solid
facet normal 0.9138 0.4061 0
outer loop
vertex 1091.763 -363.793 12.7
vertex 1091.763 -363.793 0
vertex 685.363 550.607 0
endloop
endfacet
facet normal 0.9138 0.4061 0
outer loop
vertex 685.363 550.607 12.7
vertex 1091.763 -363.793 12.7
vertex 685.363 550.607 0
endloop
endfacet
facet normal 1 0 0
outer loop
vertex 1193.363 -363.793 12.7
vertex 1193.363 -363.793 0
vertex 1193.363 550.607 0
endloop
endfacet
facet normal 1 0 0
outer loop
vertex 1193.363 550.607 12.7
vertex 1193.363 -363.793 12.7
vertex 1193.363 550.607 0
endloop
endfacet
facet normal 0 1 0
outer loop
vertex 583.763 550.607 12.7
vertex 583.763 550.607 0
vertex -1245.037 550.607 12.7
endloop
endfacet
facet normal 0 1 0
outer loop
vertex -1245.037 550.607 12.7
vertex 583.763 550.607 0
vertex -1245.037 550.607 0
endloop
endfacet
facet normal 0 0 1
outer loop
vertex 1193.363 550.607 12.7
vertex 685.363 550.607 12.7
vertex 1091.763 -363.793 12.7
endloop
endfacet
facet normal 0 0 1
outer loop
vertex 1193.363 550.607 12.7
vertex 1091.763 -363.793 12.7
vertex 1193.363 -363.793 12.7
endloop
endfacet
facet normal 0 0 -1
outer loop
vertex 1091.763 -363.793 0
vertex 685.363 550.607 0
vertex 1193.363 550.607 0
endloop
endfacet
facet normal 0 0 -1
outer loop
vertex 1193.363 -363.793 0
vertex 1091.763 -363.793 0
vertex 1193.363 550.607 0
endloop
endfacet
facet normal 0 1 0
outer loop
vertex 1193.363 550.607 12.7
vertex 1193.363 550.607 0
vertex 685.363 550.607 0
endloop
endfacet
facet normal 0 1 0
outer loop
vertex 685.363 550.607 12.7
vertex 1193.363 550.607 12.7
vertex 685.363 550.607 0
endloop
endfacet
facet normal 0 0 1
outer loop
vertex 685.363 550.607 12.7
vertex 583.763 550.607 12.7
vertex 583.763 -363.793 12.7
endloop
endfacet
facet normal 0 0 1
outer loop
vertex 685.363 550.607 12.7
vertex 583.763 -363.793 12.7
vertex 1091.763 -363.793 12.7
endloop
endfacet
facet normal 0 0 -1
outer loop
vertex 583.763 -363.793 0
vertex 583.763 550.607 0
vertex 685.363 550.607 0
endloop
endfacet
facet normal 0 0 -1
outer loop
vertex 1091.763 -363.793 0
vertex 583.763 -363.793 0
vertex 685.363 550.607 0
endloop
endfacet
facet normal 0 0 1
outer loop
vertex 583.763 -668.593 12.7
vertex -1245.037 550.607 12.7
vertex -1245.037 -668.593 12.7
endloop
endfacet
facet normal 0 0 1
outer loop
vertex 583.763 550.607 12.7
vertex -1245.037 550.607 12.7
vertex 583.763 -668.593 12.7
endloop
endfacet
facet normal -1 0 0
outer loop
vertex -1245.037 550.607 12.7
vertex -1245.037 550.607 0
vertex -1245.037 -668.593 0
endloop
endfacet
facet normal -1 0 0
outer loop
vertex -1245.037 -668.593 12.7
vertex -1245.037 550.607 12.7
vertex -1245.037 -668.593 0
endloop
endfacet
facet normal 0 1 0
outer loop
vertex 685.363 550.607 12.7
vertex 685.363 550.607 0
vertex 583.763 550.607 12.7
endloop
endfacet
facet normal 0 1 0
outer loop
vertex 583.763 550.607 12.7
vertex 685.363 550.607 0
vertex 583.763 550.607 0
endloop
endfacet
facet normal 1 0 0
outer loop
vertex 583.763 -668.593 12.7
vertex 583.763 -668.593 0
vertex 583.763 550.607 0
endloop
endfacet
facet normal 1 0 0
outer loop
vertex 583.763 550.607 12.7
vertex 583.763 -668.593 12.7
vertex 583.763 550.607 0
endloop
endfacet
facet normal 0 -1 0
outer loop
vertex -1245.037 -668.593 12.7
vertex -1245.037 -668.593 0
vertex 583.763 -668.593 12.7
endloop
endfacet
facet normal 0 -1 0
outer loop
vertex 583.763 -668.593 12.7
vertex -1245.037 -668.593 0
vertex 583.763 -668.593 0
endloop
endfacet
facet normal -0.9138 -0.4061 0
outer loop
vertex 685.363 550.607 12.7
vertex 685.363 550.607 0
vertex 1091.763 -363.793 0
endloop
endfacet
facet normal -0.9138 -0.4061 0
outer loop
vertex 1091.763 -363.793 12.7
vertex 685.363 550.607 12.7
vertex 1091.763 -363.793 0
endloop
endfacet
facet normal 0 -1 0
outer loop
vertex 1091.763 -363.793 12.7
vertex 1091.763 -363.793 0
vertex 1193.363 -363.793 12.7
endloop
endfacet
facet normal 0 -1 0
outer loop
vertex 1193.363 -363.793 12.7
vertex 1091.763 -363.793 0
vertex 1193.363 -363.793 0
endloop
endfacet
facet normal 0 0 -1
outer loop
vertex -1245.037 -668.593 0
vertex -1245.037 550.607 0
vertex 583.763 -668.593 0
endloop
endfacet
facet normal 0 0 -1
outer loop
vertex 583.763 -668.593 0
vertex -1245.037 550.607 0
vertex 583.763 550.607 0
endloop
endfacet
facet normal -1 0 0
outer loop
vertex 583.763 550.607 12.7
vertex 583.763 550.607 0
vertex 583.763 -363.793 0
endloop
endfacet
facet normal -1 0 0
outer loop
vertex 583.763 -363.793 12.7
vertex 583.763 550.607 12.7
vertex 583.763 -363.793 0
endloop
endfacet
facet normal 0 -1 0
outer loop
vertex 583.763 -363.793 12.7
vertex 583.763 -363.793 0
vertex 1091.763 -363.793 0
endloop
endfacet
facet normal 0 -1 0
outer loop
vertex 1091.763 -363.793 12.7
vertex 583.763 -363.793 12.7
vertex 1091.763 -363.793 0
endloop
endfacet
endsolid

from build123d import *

# Parameters (mm, degrees)
F1_DEPTH = 12.7
F2_DEPTH = 12.7
F3_DEPTH = 12.7


with BuildPart() as f1:
    # F0 (on Top) → F1 (new body)
    with BuildSketch(Plane.XY):
        Polygon((583.763114, 550.606559), (-1245.036886, 550.606559), (-1245.036886, -668.593441), (583.763114, -668.593441), (583.763114, -363.793441), align=None)
    extrude(amount=F1_DEPTH)


with BuildPart() as f2:
    # F0 (on Top) → F2 (new body)
    with BuildSketch(Plane.XY):
        Polygon((1193.363114, 550.606559), (685.363114, 550.606559), (1091.763114, -363.793441), (1193.363114, -363.793441), align=None)
    extrude(amount=F2_DEPTH)


with BuildPart() as f3:
    # F0 (on Top) → F3 (new body)
    with BuildSketch(Plane.XY):
        Polygon((685.363114, 550.606559), (583.763114, 550.606559), (583.763114, -363.793441), (1091.763114, -363.793441), align=None)
    extrude(amount=F3_DEPTH)


solid = Compound([f1.part, f2.part, f3.part])
